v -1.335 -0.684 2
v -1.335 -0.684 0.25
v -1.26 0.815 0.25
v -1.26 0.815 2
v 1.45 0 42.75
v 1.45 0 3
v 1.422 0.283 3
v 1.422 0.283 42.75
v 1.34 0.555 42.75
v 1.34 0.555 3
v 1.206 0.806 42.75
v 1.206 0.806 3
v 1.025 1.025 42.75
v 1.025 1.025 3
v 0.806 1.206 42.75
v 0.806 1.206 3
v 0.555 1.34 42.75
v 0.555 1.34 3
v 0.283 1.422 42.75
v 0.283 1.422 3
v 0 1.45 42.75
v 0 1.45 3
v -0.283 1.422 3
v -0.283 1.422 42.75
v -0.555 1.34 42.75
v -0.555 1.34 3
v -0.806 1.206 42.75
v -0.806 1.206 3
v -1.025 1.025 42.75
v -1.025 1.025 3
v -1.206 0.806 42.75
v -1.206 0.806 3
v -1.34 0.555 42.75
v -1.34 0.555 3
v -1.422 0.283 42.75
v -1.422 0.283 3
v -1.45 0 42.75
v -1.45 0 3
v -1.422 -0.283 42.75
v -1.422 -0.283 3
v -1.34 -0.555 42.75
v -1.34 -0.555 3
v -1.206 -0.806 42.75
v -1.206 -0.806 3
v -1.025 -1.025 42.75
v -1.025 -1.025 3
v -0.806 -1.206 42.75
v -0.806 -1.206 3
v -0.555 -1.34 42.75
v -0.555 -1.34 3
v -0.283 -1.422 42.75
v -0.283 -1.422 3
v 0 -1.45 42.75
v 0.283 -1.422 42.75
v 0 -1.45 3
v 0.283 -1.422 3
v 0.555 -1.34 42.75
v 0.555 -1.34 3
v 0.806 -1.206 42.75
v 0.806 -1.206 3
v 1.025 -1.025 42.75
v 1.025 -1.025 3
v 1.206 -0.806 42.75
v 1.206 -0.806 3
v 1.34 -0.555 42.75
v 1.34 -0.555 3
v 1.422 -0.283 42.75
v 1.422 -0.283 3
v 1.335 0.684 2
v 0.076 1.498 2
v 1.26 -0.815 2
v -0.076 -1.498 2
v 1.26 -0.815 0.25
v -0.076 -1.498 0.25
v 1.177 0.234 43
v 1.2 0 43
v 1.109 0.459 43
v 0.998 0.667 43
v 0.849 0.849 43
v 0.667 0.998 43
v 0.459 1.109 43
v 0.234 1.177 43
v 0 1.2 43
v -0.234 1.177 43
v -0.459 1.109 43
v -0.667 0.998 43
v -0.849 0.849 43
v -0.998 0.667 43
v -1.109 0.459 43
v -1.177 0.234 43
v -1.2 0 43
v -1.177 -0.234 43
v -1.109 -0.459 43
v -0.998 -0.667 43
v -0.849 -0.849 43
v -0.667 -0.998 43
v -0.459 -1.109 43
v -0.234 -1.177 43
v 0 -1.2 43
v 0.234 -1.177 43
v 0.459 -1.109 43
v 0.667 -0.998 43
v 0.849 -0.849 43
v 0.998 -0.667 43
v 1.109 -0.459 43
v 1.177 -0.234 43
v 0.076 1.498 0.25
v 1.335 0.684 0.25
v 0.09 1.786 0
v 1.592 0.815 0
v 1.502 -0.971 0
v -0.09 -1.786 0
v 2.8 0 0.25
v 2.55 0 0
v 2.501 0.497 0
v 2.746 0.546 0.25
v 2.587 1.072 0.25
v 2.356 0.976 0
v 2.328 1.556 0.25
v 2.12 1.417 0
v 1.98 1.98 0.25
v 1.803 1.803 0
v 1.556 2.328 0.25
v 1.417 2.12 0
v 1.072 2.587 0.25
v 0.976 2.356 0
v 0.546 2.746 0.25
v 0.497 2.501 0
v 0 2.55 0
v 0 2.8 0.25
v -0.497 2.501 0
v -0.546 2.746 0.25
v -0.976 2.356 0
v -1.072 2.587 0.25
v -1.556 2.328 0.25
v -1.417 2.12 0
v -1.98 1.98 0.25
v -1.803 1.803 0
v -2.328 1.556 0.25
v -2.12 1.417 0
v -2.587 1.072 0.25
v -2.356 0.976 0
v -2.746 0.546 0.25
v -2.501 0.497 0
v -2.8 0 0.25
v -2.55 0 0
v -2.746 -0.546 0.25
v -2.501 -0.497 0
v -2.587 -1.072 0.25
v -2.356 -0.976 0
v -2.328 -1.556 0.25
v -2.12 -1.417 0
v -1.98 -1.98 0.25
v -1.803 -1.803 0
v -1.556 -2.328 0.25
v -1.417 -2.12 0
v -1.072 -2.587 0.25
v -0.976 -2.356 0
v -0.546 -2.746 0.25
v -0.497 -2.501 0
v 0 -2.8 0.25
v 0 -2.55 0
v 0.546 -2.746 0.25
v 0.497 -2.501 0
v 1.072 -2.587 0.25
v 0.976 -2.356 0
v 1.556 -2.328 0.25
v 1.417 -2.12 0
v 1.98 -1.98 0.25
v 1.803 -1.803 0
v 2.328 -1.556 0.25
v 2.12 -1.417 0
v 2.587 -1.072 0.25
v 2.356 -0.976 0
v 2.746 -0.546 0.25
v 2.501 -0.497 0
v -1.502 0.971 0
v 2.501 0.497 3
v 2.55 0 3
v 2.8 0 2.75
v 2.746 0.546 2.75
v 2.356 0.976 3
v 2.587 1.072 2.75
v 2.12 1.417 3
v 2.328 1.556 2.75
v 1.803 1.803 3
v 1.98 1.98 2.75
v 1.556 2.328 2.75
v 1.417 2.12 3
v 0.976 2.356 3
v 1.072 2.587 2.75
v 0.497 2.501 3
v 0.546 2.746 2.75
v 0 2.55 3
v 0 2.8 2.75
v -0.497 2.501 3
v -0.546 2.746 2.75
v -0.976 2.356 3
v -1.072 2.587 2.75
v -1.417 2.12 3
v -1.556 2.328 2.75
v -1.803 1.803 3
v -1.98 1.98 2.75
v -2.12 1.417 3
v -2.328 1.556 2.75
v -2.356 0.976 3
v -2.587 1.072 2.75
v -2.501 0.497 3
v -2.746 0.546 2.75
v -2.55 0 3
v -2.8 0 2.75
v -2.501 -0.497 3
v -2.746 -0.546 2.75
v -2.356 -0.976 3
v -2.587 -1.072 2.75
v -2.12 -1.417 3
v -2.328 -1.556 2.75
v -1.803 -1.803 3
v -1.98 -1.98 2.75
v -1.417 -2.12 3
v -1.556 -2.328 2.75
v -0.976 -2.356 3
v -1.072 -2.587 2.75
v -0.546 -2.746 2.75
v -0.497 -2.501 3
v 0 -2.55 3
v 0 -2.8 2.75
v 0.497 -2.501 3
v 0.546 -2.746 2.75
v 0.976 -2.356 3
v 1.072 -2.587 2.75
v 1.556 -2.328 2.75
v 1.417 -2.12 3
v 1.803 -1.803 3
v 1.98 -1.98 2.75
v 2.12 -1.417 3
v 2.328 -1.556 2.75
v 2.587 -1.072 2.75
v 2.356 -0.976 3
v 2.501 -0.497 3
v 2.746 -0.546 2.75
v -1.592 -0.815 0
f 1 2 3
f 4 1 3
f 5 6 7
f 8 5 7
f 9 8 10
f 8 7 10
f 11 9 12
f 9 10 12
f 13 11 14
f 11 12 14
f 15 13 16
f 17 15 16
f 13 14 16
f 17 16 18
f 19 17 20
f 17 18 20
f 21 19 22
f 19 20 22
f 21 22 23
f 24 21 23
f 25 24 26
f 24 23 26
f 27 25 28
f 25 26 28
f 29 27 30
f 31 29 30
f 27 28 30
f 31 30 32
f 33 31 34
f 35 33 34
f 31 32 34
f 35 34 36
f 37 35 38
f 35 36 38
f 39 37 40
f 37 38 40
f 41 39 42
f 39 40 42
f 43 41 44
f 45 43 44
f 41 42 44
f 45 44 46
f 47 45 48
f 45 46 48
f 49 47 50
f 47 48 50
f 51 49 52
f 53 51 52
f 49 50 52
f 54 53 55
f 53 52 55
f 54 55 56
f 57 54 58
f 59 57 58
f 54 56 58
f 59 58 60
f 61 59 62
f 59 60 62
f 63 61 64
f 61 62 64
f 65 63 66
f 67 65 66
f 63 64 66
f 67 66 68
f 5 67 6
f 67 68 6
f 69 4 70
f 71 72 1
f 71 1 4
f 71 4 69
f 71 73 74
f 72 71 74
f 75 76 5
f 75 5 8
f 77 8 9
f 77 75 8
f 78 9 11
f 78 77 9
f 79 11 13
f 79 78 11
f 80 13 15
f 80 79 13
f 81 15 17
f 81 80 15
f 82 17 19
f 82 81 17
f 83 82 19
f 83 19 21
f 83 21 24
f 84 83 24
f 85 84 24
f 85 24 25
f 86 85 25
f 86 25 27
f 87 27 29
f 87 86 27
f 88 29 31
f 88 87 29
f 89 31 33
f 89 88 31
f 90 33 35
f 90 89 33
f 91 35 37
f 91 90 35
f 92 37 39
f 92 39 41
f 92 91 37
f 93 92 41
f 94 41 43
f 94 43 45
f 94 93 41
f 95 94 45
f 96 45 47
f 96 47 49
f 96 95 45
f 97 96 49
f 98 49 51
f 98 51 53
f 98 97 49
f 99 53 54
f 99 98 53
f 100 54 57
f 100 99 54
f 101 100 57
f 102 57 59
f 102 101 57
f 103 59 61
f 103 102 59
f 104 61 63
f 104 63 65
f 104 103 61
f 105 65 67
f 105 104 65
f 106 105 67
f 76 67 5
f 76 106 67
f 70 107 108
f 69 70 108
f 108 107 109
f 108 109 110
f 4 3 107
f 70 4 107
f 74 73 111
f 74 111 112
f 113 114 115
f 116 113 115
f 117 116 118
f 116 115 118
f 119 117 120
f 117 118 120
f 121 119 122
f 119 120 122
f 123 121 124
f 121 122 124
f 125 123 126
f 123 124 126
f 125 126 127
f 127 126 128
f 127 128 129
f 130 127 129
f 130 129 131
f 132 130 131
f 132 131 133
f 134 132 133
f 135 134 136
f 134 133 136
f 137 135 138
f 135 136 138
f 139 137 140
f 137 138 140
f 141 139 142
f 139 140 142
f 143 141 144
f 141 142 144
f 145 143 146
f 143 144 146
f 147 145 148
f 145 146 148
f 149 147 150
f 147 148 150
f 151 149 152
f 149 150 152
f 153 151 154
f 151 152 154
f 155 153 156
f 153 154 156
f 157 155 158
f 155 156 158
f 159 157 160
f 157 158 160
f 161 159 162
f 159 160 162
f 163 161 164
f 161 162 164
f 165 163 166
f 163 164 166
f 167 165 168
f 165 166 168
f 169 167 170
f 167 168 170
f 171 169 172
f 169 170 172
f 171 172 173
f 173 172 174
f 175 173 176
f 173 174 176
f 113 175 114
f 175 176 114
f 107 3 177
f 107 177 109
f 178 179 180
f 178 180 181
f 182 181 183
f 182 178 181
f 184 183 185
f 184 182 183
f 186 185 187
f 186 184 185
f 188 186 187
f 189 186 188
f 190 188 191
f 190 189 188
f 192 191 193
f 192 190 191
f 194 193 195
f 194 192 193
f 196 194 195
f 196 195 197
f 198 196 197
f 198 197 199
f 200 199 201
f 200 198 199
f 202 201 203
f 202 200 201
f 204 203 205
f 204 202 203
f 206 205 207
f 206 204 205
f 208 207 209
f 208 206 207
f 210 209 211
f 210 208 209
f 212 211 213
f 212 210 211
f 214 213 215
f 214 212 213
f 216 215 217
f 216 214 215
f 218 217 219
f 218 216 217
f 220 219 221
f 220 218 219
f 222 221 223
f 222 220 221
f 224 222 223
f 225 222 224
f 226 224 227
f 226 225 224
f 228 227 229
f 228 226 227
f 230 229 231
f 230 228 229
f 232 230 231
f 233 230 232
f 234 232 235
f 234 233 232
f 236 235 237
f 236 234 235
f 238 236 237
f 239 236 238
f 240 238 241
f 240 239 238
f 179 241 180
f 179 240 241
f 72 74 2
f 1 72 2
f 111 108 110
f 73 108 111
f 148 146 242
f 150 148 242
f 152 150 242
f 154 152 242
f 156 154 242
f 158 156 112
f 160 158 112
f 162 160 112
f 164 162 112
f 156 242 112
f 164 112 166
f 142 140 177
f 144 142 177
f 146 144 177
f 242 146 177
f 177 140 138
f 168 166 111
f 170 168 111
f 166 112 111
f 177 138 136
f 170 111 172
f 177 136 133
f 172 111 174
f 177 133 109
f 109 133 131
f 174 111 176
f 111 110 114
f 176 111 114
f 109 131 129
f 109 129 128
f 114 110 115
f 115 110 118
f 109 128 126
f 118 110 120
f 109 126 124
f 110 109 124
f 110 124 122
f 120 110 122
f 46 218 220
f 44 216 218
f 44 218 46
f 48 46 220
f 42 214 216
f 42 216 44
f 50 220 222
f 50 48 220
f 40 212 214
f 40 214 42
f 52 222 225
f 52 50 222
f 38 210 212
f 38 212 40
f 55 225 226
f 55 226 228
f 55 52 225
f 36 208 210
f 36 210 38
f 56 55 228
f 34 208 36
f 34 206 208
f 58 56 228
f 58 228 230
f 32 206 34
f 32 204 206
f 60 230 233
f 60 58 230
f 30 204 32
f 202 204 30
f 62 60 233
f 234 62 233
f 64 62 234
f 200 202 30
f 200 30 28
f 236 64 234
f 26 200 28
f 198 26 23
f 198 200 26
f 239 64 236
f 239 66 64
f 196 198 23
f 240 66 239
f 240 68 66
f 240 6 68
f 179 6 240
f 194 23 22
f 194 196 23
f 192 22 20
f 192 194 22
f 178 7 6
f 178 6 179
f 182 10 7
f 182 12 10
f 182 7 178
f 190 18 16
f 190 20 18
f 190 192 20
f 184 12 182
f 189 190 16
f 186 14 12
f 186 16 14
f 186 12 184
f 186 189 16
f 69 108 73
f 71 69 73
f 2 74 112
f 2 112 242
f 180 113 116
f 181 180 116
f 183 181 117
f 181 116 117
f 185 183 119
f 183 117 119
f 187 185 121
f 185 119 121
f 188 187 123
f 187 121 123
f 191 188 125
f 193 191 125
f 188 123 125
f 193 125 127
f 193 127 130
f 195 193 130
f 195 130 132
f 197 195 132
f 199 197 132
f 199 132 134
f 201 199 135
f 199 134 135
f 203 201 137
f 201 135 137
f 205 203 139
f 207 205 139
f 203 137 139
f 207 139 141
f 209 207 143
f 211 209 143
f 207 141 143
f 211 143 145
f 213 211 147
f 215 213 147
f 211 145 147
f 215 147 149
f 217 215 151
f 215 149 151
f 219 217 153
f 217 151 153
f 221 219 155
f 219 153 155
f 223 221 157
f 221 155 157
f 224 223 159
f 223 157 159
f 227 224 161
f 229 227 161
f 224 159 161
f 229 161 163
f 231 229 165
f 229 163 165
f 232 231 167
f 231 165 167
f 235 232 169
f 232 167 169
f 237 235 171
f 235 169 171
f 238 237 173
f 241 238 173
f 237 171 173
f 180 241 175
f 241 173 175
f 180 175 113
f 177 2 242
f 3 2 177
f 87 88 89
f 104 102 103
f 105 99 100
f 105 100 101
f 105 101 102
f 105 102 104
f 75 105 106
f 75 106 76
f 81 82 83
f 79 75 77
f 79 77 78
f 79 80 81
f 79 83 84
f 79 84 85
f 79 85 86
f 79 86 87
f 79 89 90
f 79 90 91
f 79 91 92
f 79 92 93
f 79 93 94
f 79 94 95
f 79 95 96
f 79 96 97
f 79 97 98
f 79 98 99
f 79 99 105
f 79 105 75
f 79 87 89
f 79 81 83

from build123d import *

# Parameters (mm, degrees)
SKETCH_R     = 2.8
PAD_DEPTH    = 3
SKETCH001_R  = 1.45
PAD001_DEPTH = 40
POCKET_DEPTH = 2
CHAMFER_SIZE = 0.25


with BuildPart() as part:
    # Sketch → Pad (new body)
    with BuildSketch(Plane.XY):
        Circle(SKETCH_R)
    extrude(amount=PAD_DEPTH)

    # Sketch001 (on Face3 of Pad) → Pad001 (join)
    with BuildSketch(Plane.XY.offset(3)):
        Circle(SKETCH001_R)
    extrude(amount=PAD001_DEPTH)

    # Sketch002 (on Face2 of Pad001) → Pocket (cut)
    with BuildSketch(Plane(origin=(0, 0, 0), x_dir=(1, 0, 0), z_dir=(0, 0, -1))):
        Polygon((1.259542, 0.814588), (-0.075682, 1.49809), (-1.335225, 0.683502), (-1.259542, -0.814588), (0.075682, -1.49809), (1.335225, -0.683502), align=None)
    extrude(amount=-POCKET_DEPTH, mode=Mode.SUBTRACT)

    # Chamfer
    chamfer_edges = [part.edges().sort_by_distance(p)[0] for p in [
        (-2.8, 0, 3),
        (-2.8, 0, 0),
        (1.297384, -0.065543, 0),
        (0.705454, 1.090796, 0),
        (-0.59193, 1.156339, 0),
        (-1.297384, 0.065543, 0),
        (-0.705454, -1.090796, 0),
        (0.59193, -1.156339, 0),
        (-1.45, 0, 43),
    ]]
    chamfer(chamfer_edges, length=CHAMFER_SIZE)


solid = part.part
